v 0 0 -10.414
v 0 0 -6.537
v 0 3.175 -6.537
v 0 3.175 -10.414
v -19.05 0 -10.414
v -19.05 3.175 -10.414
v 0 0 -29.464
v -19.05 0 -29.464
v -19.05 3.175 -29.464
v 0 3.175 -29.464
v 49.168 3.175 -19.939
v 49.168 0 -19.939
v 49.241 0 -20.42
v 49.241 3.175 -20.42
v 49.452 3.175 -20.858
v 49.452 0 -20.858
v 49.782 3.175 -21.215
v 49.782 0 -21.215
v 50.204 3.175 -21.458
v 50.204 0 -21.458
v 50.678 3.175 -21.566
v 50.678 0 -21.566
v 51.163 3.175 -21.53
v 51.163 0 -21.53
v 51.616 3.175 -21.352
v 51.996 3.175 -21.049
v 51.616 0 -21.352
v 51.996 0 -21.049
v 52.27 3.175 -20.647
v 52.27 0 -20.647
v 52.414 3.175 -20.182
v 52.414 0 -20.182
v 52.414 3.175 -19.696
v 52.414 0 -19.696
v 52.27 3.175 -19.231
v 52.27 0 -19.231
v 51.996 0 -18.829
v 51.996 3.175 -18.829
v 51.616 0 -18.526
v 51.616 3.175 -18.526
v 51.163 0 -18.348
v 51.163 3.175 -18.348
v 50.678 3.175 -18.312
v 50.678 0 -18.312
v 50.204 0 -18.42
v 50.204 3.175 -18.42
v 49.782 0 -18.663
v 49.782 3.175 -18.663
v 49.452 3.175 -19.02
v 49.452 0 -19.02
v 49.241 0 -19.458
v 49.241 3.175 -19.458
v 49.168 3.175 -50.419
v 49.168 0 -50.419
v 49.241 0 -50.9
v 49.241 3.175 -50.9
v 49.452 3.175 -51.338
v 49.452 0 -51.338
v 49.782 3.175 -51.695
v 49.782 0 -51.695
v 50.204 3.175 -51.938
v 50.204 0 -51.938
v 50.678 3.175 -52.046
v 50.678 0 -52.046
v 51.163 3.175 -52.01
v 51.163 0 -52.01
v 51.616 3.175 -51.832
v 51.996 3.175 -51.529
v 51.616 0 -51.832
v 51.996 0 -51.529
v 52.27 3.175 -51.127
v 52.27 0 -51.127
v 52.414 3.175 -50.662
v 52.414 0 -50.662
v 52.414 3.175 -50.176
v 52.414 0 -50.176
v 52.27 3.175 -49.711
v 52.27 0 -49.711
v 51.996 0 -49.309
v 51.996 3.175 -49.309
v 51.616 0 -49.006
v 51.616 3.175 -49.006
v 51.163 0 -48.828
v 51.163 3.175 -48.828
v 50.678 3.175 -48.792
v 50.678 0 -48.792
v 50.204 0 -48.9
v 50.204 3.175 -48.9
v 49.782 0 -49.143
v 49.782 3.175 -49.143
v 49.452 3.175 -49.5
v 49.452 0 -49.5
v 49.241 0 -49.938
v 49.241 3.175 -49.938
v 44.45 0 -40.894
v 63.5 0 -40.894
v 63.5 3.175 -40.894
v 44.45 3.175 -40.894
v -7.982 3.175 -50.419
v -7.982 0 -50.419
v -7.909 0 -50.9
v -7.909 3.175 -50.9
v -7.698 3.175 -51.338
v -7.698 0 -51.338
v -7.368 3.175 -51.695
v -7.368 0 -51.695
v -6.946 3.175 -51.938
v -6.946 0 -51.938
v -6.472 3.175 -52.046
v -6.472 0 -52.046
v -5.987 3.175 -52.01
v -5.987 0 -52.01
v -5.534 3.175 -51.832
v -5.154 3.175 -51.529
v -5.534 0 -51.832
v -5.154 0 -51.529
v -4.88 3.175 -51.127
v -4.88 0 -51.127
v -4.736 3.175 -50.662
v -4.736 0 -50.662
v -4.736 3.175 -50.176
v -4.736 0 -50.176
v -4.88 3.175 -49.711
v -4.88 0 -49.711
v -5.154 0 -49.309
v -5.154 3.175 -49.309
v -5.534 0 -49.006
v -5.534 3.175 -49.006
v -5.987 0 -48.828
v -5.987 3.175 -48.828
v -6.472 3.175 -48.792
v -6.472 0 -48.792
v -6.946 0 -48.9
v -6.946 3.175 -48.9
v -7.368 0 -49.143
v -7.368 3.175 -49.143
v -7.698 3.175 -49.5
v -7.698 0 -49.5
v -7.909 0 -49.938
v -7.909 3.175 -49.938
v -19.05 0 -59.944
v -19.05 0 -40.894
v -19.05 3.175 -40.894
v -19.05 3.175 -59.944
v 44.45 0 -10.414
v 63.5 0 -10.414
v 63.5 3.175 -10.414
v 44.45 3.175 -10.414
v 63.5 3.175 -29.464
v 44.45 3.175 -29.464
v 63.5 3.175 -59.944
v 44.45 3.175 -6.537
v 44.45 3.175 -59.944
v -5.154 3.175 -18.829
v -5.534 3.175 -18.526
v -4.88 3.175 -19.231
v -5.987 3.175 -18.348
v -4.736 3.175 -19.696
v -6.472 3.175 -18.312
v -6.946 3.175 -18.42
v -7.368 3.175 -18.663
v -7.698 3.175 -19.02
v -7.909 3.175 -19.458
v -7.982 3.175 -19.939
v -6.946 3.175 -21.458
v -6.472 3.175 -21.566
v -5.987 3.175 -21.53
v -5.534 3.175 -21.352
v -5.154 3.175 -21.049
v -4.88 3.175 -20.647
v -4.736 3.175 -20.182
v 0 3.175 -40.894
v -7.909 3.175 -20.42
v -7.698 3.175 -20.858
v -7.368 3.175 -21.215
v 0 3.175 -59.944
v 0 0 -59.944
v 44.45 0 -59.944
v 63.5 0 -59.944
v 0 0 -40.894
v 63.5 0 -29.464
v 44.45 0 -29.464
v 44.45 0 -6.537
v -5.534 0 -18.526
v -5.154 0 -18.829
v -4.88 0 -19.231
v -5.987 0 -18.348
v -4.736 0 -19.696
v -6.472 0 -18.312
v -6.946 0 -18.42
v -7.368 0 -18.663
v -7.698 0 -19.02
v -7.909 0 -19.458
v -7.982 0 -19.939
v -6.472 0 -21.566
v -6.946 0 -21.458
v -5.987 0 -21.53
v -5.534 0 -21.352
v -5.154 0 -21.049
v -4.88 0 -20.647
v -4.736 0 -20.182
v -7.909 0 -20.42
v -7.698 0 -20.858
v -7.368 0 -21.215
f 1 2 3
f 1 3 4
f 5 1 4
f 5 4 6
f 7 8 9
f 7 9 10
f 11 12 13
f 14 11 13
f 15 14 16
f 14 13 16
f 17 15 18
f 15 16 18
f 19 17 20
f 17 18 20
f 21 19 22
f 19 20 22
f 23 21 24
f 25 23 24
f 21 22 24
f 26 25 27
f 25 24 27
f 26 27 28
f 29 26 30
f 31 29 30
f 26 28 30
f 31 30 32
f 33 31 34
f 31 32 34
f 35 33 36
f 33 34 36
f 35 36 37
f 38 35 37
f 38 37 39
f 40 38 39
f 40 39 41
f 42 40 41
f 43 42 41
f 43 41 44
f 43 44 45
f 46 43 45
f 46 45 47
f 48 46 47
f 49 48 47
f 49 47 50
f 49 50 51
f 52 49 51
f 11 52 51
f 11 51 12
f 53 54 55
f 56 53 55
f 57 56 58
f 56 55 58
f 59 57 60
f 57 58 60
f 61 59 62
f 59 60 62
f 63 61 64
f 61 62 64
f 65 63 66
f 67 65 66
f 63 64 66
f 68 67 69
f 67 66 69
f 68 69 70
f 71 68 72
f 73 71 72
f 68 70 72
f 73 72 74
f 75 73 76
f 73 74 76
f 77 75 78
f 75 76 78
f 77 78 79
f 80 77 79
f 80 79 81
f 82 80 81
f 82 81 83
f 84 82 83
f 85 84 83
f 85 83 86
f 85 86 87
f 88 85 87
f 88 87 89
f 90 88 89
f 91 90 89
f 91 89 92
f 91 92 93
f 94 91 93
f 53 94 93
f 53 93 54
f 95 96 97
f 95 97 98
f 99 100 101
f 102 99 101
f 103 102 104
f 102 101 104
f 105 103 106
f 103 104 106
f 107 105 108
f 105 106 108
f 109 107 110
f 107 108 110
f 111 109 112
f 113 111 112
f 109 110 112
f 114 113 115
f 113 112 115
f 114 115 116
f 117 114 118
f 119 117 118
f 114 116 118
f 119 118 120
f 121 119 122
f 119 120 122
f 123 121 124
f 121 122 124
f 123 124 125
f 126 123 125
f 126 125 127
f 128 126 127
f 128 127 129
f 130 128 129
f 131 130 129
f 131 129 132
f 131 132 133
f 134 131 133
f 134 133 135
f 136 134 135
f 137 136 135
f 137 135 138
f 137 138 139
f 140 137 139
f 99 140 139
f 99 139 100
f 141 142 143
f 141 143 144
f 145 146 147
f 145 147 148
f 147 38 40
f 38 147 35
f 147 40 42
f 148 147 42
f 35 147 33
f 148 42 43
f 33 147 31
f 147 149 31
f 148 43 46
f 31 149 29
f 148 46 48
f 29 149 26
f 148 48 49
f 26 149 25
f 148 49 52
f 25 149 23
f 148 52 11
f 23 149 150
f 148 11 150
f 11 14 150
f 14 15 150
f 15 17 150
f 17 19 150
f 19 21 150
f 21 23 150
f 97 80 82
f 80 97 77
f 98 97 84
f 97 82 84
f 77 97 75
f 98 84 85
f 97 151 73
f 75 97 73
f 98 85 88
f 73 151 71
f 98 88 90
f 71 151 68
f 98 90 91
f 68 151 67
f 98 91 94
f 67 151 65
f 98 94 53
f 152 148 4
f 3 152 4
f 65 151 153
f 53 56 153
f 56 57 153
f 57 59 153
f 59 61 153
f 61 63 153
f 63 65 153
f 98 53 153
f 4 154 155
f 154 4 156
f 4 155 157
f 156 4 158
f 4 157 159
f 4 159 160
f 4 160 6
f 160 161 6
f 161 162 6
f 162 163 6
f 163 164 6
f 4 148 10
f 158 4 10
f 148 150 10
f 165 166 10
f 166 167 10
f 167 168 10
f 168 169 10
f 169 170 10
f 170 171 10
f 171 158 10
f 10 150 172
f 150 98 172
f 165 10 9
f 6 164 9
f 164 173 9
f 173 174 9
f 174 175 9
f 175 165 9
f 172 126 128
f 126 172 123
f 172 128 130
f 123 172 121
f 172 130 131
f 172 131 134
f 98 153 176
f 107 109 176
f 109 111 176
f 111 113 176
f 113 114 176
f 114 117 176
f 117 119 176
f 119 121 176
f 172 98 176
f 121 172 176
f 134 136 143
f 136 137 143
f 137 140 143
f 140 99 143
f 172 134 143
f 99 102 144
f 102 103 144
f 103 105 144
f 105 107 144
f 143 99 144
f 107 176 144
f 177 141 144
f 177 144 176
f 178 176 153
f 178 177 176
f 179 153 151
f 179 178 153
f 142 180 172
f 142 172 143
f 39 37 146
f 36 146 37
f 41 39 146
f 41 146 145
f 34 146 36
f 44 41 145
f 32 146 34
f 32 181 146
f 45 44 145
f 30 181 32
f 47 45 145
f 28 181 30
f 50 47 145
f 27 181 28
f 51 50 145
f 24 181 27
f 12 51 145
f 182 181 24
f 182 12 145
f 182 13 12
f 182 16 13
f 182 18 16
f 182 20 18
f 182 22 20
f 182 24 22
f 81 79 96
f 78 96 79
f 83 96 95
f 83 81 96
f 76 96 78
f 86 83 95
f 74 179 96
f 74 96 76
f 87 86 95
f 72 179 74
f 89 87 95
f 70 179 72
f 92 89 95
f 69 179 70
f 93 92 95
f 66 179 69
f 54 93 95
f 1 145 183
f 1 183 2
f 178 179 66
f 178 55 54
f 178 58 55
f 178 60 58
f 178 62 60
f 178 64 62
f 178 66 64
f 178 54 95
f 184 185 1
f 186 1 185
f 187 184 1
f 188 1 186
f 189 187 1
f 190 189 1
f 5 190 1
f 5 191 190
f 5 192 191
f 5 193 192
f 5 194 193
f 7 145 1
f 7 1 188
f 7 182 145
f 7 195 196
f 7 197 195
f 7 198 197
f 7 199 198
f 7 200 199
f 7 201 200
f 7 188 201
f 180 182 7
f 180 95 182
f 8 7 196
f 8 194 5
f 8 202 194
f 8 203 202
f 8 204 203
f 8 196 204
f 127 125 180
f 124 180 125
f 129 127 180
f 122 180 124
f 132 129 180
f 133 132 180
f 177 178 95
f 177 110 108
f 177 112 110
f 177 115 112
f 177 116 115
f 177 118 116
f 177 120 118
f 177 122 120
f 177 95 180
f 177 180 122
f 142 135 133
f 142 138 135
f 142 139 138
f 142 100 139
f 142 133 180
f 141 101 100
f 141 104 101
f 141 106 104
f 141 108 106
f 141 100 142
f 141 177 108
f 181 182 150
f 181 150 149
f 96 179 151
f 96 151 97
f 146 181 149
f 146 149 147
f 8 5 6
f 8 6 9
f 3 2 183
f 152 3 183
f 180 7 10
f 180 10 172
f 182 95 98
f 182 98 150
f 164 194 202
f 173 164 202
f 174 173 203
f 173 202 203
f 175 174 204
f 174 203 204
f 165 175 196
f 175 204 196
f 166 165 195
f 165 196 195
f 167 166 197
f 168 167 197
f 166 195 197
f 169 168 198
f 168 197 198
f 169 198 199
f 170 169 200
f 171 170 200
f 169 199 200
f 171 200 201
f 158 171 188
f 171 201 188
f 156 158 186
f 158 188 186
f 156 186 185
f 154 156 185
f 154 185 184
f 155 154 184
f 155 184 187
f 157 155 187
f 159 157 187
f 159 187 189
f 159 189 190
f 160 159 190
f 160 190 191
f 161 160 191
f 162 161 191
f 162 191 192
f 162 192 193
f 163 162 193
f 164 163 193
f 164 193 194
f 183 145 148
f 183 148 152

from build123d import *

# Parameters (mm, degrees)
BOSS_EXTRUDE1_DEPTH   = 3.175
F_4_CLEARANCE_HOLE1_D = 3.2639
SKETCH6_W             = 47.36250333
SKETCH6_H             = 20.126599321
CUT_EXTRUDE2_DEPTH    = 95.829208522
SKETCH8_W             = 57.220052793
SKETCH8_H             = 21.750209978
CUT_EXTRUDE4_DEPTH    = 88.381999067


with BuildPart() as part:
    # Sketch2 → Boss-Extrude1 (new body)
    with BuildSketch(Plane(origin=(0, 0, 0), x_dir=(1, 0, 0), z_dir=(0, 1, 0))):
        Polygon((0, 40.894), (-19.05, 40.894), (-19.05, 59.944), (0, 59.944), (0, 70.358), (44.45, 70.358), (44.45, 59.944), (63.5, 59.944), (63.5, 40.894), (44.45, 40.894), (44.45, 29.464), (63.5, 29.464), (63.5, 10.414), (44.45, 10.414), (44.45, 0), (0, 0), (0, 10.414), (-19.05, 10.414), (-19.05, 29.464), (0, 29.464), align=None)
    extrude(amount=BOSS_EXTRUDE1_DEPTH)

    # #4 Clearance Hole1 (through all)
    with Locations(Plane(origin=(0, 3.175, 0), x_dir=(1, 0, 0), z_dir=(0, 1, 0))):
        with Locations((-6.35, 50.419), (50.8, 50.419), (50.8, 19.939), (-6.35, 19.939)):
            Hole(F_4_CLEARANCE_HOLE1_D / 2)

    # Sketch6 → Cut-Extrude2 (cut, through all)
    with BuildSketch(Plane.XZ):
        with Locations((20.768748335, -70.00729966)):
            Rectangle(SKETCH6_W, SKETCH6_H)
    extrude(amount=-CUT_EXTRUDE2_DEPTH, mode=Mode.SUBTRACT)

    # Sketch8 → Cut-Extrude4 (cut, through all)
    with BuildSketch(Plane.XZ):
        with Locations((24.07463768, 4.33828372)):
            Rectangle(SKETCH8_W, SKETCH8_H)
    extrude(amount=-CUT_EXTRUDE4_DEPTH, mode=Mode.SUBTRACT)


solid = part.part
